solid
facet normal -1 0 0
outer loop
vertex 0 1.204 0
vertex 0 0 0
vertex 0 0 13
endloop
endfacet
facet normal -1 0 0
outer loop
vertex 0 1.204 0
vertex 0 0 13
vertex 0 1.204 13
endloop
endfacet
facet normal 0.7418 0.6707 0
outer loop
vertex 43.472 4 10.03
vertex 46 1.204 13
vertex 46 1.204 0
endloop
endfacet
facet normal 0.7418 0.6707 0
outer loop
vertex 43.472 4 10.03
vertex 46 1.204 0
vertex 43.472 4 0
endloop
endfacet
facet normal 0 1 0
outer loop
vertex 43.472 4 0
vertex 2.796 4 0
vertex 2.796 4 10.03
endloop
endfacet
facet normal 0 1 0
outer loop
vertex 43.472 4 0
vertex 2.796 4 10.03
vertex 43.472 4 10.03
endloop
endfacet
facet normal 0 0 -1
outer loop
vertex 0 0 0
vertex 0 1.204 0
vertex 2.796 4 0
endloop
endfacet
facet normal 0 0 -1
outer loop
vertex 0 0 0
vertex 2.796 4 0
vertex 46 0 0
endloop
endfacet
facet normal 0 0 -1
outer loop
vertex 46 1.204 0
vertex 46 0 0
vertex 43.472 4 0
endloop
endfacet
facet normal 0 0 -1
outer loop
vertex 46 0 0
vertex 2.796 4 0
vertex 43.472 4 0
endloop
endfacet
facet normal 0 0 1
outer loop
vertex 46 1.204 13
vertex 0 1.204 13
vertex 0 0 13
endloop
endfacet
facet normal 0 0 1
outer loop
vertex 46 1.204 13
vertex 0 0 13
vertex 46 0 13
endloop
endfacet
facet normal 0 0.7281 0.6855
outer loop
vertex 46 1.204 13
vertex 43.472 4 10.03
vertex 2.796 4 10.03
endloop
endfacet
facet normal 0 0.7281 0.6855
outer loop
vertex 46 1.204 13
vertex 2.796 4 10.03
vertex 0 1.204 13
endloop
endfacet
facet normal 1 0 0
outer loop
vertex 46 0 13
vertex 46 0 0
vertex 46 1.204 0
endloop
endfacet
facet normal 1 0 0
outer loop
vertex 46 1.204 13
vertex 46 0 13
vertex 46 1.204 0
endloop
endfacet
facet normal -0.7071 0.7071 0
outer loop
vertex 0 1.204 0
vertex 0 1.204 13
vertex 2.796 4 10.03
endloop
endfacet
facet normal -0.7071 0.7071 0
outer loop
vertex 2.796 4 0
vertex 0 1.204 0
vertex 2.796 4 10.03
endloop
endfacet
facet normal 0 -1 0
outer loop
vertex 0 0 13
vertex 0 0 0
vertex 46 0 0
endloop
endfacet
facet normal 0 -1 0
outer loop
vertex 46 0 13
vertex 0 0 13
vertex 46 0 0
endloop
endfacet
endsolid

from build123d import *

# Parameters (mm, degrees)
SKETCH1_W           = 46
SKETCH1_H           = 4
BOSS_EXTRUDE1_DEPTH = 13
CUT_EXTRUDE1_DEPTH  = 46
CUT_EXTRUDE2_DEPTH  = 46
CUT_EXTRUDE3_DEPTH  = 46


with BuildPart() as part:
    # Sketch1 → Boss-Extrude1 (new body)
    with BuildSketch(Plane.XY):
        with Locations((23, 2)):
            Rectangle(SKETCH1_W, SKETCH1_H)
    extrude(amount=BOSS_EXTRUDE1_DEPTH)

    # Sketch2 → Cut-Extrude1 (cut)
    with BuildSketch(Plane(origin=(46, 0, 0), x_dir=(0, 0, -1), z_dir=(1, 0, 0))):
        Polygon((-10.029675263, 4), (-13, 1.204486068), (-13, 4), align=None)
    extrude(amount=-CUT_EXTRUDE1_DEPTH, mode=Mode.SUBTRACT)

    # Sketch3 → Cut-Extrude2 (cut)
    with BuildSketch(Plane.XY.offset(13)):
        Polygon((46, 1.204486068), (43.471571356, 4), (46, 4), align=None)
    extrude(amount=-CUT_EXTRUDE2_DEPTH, mode=Mode.SUBTRACT)

    # Sketch4 → Cut-Extrude3 (cut)
    with BuildSketch(Plane.XY.offset(13)):
        Polygon((0, 1.204486068), (3.068298022, 4.272784089), (0, 4.272784089), align=None)
    extrude(amount=-CUT_EXTRUDE3_DEPTH, mode=Mode.SUBTRACT)


solid = part.part
